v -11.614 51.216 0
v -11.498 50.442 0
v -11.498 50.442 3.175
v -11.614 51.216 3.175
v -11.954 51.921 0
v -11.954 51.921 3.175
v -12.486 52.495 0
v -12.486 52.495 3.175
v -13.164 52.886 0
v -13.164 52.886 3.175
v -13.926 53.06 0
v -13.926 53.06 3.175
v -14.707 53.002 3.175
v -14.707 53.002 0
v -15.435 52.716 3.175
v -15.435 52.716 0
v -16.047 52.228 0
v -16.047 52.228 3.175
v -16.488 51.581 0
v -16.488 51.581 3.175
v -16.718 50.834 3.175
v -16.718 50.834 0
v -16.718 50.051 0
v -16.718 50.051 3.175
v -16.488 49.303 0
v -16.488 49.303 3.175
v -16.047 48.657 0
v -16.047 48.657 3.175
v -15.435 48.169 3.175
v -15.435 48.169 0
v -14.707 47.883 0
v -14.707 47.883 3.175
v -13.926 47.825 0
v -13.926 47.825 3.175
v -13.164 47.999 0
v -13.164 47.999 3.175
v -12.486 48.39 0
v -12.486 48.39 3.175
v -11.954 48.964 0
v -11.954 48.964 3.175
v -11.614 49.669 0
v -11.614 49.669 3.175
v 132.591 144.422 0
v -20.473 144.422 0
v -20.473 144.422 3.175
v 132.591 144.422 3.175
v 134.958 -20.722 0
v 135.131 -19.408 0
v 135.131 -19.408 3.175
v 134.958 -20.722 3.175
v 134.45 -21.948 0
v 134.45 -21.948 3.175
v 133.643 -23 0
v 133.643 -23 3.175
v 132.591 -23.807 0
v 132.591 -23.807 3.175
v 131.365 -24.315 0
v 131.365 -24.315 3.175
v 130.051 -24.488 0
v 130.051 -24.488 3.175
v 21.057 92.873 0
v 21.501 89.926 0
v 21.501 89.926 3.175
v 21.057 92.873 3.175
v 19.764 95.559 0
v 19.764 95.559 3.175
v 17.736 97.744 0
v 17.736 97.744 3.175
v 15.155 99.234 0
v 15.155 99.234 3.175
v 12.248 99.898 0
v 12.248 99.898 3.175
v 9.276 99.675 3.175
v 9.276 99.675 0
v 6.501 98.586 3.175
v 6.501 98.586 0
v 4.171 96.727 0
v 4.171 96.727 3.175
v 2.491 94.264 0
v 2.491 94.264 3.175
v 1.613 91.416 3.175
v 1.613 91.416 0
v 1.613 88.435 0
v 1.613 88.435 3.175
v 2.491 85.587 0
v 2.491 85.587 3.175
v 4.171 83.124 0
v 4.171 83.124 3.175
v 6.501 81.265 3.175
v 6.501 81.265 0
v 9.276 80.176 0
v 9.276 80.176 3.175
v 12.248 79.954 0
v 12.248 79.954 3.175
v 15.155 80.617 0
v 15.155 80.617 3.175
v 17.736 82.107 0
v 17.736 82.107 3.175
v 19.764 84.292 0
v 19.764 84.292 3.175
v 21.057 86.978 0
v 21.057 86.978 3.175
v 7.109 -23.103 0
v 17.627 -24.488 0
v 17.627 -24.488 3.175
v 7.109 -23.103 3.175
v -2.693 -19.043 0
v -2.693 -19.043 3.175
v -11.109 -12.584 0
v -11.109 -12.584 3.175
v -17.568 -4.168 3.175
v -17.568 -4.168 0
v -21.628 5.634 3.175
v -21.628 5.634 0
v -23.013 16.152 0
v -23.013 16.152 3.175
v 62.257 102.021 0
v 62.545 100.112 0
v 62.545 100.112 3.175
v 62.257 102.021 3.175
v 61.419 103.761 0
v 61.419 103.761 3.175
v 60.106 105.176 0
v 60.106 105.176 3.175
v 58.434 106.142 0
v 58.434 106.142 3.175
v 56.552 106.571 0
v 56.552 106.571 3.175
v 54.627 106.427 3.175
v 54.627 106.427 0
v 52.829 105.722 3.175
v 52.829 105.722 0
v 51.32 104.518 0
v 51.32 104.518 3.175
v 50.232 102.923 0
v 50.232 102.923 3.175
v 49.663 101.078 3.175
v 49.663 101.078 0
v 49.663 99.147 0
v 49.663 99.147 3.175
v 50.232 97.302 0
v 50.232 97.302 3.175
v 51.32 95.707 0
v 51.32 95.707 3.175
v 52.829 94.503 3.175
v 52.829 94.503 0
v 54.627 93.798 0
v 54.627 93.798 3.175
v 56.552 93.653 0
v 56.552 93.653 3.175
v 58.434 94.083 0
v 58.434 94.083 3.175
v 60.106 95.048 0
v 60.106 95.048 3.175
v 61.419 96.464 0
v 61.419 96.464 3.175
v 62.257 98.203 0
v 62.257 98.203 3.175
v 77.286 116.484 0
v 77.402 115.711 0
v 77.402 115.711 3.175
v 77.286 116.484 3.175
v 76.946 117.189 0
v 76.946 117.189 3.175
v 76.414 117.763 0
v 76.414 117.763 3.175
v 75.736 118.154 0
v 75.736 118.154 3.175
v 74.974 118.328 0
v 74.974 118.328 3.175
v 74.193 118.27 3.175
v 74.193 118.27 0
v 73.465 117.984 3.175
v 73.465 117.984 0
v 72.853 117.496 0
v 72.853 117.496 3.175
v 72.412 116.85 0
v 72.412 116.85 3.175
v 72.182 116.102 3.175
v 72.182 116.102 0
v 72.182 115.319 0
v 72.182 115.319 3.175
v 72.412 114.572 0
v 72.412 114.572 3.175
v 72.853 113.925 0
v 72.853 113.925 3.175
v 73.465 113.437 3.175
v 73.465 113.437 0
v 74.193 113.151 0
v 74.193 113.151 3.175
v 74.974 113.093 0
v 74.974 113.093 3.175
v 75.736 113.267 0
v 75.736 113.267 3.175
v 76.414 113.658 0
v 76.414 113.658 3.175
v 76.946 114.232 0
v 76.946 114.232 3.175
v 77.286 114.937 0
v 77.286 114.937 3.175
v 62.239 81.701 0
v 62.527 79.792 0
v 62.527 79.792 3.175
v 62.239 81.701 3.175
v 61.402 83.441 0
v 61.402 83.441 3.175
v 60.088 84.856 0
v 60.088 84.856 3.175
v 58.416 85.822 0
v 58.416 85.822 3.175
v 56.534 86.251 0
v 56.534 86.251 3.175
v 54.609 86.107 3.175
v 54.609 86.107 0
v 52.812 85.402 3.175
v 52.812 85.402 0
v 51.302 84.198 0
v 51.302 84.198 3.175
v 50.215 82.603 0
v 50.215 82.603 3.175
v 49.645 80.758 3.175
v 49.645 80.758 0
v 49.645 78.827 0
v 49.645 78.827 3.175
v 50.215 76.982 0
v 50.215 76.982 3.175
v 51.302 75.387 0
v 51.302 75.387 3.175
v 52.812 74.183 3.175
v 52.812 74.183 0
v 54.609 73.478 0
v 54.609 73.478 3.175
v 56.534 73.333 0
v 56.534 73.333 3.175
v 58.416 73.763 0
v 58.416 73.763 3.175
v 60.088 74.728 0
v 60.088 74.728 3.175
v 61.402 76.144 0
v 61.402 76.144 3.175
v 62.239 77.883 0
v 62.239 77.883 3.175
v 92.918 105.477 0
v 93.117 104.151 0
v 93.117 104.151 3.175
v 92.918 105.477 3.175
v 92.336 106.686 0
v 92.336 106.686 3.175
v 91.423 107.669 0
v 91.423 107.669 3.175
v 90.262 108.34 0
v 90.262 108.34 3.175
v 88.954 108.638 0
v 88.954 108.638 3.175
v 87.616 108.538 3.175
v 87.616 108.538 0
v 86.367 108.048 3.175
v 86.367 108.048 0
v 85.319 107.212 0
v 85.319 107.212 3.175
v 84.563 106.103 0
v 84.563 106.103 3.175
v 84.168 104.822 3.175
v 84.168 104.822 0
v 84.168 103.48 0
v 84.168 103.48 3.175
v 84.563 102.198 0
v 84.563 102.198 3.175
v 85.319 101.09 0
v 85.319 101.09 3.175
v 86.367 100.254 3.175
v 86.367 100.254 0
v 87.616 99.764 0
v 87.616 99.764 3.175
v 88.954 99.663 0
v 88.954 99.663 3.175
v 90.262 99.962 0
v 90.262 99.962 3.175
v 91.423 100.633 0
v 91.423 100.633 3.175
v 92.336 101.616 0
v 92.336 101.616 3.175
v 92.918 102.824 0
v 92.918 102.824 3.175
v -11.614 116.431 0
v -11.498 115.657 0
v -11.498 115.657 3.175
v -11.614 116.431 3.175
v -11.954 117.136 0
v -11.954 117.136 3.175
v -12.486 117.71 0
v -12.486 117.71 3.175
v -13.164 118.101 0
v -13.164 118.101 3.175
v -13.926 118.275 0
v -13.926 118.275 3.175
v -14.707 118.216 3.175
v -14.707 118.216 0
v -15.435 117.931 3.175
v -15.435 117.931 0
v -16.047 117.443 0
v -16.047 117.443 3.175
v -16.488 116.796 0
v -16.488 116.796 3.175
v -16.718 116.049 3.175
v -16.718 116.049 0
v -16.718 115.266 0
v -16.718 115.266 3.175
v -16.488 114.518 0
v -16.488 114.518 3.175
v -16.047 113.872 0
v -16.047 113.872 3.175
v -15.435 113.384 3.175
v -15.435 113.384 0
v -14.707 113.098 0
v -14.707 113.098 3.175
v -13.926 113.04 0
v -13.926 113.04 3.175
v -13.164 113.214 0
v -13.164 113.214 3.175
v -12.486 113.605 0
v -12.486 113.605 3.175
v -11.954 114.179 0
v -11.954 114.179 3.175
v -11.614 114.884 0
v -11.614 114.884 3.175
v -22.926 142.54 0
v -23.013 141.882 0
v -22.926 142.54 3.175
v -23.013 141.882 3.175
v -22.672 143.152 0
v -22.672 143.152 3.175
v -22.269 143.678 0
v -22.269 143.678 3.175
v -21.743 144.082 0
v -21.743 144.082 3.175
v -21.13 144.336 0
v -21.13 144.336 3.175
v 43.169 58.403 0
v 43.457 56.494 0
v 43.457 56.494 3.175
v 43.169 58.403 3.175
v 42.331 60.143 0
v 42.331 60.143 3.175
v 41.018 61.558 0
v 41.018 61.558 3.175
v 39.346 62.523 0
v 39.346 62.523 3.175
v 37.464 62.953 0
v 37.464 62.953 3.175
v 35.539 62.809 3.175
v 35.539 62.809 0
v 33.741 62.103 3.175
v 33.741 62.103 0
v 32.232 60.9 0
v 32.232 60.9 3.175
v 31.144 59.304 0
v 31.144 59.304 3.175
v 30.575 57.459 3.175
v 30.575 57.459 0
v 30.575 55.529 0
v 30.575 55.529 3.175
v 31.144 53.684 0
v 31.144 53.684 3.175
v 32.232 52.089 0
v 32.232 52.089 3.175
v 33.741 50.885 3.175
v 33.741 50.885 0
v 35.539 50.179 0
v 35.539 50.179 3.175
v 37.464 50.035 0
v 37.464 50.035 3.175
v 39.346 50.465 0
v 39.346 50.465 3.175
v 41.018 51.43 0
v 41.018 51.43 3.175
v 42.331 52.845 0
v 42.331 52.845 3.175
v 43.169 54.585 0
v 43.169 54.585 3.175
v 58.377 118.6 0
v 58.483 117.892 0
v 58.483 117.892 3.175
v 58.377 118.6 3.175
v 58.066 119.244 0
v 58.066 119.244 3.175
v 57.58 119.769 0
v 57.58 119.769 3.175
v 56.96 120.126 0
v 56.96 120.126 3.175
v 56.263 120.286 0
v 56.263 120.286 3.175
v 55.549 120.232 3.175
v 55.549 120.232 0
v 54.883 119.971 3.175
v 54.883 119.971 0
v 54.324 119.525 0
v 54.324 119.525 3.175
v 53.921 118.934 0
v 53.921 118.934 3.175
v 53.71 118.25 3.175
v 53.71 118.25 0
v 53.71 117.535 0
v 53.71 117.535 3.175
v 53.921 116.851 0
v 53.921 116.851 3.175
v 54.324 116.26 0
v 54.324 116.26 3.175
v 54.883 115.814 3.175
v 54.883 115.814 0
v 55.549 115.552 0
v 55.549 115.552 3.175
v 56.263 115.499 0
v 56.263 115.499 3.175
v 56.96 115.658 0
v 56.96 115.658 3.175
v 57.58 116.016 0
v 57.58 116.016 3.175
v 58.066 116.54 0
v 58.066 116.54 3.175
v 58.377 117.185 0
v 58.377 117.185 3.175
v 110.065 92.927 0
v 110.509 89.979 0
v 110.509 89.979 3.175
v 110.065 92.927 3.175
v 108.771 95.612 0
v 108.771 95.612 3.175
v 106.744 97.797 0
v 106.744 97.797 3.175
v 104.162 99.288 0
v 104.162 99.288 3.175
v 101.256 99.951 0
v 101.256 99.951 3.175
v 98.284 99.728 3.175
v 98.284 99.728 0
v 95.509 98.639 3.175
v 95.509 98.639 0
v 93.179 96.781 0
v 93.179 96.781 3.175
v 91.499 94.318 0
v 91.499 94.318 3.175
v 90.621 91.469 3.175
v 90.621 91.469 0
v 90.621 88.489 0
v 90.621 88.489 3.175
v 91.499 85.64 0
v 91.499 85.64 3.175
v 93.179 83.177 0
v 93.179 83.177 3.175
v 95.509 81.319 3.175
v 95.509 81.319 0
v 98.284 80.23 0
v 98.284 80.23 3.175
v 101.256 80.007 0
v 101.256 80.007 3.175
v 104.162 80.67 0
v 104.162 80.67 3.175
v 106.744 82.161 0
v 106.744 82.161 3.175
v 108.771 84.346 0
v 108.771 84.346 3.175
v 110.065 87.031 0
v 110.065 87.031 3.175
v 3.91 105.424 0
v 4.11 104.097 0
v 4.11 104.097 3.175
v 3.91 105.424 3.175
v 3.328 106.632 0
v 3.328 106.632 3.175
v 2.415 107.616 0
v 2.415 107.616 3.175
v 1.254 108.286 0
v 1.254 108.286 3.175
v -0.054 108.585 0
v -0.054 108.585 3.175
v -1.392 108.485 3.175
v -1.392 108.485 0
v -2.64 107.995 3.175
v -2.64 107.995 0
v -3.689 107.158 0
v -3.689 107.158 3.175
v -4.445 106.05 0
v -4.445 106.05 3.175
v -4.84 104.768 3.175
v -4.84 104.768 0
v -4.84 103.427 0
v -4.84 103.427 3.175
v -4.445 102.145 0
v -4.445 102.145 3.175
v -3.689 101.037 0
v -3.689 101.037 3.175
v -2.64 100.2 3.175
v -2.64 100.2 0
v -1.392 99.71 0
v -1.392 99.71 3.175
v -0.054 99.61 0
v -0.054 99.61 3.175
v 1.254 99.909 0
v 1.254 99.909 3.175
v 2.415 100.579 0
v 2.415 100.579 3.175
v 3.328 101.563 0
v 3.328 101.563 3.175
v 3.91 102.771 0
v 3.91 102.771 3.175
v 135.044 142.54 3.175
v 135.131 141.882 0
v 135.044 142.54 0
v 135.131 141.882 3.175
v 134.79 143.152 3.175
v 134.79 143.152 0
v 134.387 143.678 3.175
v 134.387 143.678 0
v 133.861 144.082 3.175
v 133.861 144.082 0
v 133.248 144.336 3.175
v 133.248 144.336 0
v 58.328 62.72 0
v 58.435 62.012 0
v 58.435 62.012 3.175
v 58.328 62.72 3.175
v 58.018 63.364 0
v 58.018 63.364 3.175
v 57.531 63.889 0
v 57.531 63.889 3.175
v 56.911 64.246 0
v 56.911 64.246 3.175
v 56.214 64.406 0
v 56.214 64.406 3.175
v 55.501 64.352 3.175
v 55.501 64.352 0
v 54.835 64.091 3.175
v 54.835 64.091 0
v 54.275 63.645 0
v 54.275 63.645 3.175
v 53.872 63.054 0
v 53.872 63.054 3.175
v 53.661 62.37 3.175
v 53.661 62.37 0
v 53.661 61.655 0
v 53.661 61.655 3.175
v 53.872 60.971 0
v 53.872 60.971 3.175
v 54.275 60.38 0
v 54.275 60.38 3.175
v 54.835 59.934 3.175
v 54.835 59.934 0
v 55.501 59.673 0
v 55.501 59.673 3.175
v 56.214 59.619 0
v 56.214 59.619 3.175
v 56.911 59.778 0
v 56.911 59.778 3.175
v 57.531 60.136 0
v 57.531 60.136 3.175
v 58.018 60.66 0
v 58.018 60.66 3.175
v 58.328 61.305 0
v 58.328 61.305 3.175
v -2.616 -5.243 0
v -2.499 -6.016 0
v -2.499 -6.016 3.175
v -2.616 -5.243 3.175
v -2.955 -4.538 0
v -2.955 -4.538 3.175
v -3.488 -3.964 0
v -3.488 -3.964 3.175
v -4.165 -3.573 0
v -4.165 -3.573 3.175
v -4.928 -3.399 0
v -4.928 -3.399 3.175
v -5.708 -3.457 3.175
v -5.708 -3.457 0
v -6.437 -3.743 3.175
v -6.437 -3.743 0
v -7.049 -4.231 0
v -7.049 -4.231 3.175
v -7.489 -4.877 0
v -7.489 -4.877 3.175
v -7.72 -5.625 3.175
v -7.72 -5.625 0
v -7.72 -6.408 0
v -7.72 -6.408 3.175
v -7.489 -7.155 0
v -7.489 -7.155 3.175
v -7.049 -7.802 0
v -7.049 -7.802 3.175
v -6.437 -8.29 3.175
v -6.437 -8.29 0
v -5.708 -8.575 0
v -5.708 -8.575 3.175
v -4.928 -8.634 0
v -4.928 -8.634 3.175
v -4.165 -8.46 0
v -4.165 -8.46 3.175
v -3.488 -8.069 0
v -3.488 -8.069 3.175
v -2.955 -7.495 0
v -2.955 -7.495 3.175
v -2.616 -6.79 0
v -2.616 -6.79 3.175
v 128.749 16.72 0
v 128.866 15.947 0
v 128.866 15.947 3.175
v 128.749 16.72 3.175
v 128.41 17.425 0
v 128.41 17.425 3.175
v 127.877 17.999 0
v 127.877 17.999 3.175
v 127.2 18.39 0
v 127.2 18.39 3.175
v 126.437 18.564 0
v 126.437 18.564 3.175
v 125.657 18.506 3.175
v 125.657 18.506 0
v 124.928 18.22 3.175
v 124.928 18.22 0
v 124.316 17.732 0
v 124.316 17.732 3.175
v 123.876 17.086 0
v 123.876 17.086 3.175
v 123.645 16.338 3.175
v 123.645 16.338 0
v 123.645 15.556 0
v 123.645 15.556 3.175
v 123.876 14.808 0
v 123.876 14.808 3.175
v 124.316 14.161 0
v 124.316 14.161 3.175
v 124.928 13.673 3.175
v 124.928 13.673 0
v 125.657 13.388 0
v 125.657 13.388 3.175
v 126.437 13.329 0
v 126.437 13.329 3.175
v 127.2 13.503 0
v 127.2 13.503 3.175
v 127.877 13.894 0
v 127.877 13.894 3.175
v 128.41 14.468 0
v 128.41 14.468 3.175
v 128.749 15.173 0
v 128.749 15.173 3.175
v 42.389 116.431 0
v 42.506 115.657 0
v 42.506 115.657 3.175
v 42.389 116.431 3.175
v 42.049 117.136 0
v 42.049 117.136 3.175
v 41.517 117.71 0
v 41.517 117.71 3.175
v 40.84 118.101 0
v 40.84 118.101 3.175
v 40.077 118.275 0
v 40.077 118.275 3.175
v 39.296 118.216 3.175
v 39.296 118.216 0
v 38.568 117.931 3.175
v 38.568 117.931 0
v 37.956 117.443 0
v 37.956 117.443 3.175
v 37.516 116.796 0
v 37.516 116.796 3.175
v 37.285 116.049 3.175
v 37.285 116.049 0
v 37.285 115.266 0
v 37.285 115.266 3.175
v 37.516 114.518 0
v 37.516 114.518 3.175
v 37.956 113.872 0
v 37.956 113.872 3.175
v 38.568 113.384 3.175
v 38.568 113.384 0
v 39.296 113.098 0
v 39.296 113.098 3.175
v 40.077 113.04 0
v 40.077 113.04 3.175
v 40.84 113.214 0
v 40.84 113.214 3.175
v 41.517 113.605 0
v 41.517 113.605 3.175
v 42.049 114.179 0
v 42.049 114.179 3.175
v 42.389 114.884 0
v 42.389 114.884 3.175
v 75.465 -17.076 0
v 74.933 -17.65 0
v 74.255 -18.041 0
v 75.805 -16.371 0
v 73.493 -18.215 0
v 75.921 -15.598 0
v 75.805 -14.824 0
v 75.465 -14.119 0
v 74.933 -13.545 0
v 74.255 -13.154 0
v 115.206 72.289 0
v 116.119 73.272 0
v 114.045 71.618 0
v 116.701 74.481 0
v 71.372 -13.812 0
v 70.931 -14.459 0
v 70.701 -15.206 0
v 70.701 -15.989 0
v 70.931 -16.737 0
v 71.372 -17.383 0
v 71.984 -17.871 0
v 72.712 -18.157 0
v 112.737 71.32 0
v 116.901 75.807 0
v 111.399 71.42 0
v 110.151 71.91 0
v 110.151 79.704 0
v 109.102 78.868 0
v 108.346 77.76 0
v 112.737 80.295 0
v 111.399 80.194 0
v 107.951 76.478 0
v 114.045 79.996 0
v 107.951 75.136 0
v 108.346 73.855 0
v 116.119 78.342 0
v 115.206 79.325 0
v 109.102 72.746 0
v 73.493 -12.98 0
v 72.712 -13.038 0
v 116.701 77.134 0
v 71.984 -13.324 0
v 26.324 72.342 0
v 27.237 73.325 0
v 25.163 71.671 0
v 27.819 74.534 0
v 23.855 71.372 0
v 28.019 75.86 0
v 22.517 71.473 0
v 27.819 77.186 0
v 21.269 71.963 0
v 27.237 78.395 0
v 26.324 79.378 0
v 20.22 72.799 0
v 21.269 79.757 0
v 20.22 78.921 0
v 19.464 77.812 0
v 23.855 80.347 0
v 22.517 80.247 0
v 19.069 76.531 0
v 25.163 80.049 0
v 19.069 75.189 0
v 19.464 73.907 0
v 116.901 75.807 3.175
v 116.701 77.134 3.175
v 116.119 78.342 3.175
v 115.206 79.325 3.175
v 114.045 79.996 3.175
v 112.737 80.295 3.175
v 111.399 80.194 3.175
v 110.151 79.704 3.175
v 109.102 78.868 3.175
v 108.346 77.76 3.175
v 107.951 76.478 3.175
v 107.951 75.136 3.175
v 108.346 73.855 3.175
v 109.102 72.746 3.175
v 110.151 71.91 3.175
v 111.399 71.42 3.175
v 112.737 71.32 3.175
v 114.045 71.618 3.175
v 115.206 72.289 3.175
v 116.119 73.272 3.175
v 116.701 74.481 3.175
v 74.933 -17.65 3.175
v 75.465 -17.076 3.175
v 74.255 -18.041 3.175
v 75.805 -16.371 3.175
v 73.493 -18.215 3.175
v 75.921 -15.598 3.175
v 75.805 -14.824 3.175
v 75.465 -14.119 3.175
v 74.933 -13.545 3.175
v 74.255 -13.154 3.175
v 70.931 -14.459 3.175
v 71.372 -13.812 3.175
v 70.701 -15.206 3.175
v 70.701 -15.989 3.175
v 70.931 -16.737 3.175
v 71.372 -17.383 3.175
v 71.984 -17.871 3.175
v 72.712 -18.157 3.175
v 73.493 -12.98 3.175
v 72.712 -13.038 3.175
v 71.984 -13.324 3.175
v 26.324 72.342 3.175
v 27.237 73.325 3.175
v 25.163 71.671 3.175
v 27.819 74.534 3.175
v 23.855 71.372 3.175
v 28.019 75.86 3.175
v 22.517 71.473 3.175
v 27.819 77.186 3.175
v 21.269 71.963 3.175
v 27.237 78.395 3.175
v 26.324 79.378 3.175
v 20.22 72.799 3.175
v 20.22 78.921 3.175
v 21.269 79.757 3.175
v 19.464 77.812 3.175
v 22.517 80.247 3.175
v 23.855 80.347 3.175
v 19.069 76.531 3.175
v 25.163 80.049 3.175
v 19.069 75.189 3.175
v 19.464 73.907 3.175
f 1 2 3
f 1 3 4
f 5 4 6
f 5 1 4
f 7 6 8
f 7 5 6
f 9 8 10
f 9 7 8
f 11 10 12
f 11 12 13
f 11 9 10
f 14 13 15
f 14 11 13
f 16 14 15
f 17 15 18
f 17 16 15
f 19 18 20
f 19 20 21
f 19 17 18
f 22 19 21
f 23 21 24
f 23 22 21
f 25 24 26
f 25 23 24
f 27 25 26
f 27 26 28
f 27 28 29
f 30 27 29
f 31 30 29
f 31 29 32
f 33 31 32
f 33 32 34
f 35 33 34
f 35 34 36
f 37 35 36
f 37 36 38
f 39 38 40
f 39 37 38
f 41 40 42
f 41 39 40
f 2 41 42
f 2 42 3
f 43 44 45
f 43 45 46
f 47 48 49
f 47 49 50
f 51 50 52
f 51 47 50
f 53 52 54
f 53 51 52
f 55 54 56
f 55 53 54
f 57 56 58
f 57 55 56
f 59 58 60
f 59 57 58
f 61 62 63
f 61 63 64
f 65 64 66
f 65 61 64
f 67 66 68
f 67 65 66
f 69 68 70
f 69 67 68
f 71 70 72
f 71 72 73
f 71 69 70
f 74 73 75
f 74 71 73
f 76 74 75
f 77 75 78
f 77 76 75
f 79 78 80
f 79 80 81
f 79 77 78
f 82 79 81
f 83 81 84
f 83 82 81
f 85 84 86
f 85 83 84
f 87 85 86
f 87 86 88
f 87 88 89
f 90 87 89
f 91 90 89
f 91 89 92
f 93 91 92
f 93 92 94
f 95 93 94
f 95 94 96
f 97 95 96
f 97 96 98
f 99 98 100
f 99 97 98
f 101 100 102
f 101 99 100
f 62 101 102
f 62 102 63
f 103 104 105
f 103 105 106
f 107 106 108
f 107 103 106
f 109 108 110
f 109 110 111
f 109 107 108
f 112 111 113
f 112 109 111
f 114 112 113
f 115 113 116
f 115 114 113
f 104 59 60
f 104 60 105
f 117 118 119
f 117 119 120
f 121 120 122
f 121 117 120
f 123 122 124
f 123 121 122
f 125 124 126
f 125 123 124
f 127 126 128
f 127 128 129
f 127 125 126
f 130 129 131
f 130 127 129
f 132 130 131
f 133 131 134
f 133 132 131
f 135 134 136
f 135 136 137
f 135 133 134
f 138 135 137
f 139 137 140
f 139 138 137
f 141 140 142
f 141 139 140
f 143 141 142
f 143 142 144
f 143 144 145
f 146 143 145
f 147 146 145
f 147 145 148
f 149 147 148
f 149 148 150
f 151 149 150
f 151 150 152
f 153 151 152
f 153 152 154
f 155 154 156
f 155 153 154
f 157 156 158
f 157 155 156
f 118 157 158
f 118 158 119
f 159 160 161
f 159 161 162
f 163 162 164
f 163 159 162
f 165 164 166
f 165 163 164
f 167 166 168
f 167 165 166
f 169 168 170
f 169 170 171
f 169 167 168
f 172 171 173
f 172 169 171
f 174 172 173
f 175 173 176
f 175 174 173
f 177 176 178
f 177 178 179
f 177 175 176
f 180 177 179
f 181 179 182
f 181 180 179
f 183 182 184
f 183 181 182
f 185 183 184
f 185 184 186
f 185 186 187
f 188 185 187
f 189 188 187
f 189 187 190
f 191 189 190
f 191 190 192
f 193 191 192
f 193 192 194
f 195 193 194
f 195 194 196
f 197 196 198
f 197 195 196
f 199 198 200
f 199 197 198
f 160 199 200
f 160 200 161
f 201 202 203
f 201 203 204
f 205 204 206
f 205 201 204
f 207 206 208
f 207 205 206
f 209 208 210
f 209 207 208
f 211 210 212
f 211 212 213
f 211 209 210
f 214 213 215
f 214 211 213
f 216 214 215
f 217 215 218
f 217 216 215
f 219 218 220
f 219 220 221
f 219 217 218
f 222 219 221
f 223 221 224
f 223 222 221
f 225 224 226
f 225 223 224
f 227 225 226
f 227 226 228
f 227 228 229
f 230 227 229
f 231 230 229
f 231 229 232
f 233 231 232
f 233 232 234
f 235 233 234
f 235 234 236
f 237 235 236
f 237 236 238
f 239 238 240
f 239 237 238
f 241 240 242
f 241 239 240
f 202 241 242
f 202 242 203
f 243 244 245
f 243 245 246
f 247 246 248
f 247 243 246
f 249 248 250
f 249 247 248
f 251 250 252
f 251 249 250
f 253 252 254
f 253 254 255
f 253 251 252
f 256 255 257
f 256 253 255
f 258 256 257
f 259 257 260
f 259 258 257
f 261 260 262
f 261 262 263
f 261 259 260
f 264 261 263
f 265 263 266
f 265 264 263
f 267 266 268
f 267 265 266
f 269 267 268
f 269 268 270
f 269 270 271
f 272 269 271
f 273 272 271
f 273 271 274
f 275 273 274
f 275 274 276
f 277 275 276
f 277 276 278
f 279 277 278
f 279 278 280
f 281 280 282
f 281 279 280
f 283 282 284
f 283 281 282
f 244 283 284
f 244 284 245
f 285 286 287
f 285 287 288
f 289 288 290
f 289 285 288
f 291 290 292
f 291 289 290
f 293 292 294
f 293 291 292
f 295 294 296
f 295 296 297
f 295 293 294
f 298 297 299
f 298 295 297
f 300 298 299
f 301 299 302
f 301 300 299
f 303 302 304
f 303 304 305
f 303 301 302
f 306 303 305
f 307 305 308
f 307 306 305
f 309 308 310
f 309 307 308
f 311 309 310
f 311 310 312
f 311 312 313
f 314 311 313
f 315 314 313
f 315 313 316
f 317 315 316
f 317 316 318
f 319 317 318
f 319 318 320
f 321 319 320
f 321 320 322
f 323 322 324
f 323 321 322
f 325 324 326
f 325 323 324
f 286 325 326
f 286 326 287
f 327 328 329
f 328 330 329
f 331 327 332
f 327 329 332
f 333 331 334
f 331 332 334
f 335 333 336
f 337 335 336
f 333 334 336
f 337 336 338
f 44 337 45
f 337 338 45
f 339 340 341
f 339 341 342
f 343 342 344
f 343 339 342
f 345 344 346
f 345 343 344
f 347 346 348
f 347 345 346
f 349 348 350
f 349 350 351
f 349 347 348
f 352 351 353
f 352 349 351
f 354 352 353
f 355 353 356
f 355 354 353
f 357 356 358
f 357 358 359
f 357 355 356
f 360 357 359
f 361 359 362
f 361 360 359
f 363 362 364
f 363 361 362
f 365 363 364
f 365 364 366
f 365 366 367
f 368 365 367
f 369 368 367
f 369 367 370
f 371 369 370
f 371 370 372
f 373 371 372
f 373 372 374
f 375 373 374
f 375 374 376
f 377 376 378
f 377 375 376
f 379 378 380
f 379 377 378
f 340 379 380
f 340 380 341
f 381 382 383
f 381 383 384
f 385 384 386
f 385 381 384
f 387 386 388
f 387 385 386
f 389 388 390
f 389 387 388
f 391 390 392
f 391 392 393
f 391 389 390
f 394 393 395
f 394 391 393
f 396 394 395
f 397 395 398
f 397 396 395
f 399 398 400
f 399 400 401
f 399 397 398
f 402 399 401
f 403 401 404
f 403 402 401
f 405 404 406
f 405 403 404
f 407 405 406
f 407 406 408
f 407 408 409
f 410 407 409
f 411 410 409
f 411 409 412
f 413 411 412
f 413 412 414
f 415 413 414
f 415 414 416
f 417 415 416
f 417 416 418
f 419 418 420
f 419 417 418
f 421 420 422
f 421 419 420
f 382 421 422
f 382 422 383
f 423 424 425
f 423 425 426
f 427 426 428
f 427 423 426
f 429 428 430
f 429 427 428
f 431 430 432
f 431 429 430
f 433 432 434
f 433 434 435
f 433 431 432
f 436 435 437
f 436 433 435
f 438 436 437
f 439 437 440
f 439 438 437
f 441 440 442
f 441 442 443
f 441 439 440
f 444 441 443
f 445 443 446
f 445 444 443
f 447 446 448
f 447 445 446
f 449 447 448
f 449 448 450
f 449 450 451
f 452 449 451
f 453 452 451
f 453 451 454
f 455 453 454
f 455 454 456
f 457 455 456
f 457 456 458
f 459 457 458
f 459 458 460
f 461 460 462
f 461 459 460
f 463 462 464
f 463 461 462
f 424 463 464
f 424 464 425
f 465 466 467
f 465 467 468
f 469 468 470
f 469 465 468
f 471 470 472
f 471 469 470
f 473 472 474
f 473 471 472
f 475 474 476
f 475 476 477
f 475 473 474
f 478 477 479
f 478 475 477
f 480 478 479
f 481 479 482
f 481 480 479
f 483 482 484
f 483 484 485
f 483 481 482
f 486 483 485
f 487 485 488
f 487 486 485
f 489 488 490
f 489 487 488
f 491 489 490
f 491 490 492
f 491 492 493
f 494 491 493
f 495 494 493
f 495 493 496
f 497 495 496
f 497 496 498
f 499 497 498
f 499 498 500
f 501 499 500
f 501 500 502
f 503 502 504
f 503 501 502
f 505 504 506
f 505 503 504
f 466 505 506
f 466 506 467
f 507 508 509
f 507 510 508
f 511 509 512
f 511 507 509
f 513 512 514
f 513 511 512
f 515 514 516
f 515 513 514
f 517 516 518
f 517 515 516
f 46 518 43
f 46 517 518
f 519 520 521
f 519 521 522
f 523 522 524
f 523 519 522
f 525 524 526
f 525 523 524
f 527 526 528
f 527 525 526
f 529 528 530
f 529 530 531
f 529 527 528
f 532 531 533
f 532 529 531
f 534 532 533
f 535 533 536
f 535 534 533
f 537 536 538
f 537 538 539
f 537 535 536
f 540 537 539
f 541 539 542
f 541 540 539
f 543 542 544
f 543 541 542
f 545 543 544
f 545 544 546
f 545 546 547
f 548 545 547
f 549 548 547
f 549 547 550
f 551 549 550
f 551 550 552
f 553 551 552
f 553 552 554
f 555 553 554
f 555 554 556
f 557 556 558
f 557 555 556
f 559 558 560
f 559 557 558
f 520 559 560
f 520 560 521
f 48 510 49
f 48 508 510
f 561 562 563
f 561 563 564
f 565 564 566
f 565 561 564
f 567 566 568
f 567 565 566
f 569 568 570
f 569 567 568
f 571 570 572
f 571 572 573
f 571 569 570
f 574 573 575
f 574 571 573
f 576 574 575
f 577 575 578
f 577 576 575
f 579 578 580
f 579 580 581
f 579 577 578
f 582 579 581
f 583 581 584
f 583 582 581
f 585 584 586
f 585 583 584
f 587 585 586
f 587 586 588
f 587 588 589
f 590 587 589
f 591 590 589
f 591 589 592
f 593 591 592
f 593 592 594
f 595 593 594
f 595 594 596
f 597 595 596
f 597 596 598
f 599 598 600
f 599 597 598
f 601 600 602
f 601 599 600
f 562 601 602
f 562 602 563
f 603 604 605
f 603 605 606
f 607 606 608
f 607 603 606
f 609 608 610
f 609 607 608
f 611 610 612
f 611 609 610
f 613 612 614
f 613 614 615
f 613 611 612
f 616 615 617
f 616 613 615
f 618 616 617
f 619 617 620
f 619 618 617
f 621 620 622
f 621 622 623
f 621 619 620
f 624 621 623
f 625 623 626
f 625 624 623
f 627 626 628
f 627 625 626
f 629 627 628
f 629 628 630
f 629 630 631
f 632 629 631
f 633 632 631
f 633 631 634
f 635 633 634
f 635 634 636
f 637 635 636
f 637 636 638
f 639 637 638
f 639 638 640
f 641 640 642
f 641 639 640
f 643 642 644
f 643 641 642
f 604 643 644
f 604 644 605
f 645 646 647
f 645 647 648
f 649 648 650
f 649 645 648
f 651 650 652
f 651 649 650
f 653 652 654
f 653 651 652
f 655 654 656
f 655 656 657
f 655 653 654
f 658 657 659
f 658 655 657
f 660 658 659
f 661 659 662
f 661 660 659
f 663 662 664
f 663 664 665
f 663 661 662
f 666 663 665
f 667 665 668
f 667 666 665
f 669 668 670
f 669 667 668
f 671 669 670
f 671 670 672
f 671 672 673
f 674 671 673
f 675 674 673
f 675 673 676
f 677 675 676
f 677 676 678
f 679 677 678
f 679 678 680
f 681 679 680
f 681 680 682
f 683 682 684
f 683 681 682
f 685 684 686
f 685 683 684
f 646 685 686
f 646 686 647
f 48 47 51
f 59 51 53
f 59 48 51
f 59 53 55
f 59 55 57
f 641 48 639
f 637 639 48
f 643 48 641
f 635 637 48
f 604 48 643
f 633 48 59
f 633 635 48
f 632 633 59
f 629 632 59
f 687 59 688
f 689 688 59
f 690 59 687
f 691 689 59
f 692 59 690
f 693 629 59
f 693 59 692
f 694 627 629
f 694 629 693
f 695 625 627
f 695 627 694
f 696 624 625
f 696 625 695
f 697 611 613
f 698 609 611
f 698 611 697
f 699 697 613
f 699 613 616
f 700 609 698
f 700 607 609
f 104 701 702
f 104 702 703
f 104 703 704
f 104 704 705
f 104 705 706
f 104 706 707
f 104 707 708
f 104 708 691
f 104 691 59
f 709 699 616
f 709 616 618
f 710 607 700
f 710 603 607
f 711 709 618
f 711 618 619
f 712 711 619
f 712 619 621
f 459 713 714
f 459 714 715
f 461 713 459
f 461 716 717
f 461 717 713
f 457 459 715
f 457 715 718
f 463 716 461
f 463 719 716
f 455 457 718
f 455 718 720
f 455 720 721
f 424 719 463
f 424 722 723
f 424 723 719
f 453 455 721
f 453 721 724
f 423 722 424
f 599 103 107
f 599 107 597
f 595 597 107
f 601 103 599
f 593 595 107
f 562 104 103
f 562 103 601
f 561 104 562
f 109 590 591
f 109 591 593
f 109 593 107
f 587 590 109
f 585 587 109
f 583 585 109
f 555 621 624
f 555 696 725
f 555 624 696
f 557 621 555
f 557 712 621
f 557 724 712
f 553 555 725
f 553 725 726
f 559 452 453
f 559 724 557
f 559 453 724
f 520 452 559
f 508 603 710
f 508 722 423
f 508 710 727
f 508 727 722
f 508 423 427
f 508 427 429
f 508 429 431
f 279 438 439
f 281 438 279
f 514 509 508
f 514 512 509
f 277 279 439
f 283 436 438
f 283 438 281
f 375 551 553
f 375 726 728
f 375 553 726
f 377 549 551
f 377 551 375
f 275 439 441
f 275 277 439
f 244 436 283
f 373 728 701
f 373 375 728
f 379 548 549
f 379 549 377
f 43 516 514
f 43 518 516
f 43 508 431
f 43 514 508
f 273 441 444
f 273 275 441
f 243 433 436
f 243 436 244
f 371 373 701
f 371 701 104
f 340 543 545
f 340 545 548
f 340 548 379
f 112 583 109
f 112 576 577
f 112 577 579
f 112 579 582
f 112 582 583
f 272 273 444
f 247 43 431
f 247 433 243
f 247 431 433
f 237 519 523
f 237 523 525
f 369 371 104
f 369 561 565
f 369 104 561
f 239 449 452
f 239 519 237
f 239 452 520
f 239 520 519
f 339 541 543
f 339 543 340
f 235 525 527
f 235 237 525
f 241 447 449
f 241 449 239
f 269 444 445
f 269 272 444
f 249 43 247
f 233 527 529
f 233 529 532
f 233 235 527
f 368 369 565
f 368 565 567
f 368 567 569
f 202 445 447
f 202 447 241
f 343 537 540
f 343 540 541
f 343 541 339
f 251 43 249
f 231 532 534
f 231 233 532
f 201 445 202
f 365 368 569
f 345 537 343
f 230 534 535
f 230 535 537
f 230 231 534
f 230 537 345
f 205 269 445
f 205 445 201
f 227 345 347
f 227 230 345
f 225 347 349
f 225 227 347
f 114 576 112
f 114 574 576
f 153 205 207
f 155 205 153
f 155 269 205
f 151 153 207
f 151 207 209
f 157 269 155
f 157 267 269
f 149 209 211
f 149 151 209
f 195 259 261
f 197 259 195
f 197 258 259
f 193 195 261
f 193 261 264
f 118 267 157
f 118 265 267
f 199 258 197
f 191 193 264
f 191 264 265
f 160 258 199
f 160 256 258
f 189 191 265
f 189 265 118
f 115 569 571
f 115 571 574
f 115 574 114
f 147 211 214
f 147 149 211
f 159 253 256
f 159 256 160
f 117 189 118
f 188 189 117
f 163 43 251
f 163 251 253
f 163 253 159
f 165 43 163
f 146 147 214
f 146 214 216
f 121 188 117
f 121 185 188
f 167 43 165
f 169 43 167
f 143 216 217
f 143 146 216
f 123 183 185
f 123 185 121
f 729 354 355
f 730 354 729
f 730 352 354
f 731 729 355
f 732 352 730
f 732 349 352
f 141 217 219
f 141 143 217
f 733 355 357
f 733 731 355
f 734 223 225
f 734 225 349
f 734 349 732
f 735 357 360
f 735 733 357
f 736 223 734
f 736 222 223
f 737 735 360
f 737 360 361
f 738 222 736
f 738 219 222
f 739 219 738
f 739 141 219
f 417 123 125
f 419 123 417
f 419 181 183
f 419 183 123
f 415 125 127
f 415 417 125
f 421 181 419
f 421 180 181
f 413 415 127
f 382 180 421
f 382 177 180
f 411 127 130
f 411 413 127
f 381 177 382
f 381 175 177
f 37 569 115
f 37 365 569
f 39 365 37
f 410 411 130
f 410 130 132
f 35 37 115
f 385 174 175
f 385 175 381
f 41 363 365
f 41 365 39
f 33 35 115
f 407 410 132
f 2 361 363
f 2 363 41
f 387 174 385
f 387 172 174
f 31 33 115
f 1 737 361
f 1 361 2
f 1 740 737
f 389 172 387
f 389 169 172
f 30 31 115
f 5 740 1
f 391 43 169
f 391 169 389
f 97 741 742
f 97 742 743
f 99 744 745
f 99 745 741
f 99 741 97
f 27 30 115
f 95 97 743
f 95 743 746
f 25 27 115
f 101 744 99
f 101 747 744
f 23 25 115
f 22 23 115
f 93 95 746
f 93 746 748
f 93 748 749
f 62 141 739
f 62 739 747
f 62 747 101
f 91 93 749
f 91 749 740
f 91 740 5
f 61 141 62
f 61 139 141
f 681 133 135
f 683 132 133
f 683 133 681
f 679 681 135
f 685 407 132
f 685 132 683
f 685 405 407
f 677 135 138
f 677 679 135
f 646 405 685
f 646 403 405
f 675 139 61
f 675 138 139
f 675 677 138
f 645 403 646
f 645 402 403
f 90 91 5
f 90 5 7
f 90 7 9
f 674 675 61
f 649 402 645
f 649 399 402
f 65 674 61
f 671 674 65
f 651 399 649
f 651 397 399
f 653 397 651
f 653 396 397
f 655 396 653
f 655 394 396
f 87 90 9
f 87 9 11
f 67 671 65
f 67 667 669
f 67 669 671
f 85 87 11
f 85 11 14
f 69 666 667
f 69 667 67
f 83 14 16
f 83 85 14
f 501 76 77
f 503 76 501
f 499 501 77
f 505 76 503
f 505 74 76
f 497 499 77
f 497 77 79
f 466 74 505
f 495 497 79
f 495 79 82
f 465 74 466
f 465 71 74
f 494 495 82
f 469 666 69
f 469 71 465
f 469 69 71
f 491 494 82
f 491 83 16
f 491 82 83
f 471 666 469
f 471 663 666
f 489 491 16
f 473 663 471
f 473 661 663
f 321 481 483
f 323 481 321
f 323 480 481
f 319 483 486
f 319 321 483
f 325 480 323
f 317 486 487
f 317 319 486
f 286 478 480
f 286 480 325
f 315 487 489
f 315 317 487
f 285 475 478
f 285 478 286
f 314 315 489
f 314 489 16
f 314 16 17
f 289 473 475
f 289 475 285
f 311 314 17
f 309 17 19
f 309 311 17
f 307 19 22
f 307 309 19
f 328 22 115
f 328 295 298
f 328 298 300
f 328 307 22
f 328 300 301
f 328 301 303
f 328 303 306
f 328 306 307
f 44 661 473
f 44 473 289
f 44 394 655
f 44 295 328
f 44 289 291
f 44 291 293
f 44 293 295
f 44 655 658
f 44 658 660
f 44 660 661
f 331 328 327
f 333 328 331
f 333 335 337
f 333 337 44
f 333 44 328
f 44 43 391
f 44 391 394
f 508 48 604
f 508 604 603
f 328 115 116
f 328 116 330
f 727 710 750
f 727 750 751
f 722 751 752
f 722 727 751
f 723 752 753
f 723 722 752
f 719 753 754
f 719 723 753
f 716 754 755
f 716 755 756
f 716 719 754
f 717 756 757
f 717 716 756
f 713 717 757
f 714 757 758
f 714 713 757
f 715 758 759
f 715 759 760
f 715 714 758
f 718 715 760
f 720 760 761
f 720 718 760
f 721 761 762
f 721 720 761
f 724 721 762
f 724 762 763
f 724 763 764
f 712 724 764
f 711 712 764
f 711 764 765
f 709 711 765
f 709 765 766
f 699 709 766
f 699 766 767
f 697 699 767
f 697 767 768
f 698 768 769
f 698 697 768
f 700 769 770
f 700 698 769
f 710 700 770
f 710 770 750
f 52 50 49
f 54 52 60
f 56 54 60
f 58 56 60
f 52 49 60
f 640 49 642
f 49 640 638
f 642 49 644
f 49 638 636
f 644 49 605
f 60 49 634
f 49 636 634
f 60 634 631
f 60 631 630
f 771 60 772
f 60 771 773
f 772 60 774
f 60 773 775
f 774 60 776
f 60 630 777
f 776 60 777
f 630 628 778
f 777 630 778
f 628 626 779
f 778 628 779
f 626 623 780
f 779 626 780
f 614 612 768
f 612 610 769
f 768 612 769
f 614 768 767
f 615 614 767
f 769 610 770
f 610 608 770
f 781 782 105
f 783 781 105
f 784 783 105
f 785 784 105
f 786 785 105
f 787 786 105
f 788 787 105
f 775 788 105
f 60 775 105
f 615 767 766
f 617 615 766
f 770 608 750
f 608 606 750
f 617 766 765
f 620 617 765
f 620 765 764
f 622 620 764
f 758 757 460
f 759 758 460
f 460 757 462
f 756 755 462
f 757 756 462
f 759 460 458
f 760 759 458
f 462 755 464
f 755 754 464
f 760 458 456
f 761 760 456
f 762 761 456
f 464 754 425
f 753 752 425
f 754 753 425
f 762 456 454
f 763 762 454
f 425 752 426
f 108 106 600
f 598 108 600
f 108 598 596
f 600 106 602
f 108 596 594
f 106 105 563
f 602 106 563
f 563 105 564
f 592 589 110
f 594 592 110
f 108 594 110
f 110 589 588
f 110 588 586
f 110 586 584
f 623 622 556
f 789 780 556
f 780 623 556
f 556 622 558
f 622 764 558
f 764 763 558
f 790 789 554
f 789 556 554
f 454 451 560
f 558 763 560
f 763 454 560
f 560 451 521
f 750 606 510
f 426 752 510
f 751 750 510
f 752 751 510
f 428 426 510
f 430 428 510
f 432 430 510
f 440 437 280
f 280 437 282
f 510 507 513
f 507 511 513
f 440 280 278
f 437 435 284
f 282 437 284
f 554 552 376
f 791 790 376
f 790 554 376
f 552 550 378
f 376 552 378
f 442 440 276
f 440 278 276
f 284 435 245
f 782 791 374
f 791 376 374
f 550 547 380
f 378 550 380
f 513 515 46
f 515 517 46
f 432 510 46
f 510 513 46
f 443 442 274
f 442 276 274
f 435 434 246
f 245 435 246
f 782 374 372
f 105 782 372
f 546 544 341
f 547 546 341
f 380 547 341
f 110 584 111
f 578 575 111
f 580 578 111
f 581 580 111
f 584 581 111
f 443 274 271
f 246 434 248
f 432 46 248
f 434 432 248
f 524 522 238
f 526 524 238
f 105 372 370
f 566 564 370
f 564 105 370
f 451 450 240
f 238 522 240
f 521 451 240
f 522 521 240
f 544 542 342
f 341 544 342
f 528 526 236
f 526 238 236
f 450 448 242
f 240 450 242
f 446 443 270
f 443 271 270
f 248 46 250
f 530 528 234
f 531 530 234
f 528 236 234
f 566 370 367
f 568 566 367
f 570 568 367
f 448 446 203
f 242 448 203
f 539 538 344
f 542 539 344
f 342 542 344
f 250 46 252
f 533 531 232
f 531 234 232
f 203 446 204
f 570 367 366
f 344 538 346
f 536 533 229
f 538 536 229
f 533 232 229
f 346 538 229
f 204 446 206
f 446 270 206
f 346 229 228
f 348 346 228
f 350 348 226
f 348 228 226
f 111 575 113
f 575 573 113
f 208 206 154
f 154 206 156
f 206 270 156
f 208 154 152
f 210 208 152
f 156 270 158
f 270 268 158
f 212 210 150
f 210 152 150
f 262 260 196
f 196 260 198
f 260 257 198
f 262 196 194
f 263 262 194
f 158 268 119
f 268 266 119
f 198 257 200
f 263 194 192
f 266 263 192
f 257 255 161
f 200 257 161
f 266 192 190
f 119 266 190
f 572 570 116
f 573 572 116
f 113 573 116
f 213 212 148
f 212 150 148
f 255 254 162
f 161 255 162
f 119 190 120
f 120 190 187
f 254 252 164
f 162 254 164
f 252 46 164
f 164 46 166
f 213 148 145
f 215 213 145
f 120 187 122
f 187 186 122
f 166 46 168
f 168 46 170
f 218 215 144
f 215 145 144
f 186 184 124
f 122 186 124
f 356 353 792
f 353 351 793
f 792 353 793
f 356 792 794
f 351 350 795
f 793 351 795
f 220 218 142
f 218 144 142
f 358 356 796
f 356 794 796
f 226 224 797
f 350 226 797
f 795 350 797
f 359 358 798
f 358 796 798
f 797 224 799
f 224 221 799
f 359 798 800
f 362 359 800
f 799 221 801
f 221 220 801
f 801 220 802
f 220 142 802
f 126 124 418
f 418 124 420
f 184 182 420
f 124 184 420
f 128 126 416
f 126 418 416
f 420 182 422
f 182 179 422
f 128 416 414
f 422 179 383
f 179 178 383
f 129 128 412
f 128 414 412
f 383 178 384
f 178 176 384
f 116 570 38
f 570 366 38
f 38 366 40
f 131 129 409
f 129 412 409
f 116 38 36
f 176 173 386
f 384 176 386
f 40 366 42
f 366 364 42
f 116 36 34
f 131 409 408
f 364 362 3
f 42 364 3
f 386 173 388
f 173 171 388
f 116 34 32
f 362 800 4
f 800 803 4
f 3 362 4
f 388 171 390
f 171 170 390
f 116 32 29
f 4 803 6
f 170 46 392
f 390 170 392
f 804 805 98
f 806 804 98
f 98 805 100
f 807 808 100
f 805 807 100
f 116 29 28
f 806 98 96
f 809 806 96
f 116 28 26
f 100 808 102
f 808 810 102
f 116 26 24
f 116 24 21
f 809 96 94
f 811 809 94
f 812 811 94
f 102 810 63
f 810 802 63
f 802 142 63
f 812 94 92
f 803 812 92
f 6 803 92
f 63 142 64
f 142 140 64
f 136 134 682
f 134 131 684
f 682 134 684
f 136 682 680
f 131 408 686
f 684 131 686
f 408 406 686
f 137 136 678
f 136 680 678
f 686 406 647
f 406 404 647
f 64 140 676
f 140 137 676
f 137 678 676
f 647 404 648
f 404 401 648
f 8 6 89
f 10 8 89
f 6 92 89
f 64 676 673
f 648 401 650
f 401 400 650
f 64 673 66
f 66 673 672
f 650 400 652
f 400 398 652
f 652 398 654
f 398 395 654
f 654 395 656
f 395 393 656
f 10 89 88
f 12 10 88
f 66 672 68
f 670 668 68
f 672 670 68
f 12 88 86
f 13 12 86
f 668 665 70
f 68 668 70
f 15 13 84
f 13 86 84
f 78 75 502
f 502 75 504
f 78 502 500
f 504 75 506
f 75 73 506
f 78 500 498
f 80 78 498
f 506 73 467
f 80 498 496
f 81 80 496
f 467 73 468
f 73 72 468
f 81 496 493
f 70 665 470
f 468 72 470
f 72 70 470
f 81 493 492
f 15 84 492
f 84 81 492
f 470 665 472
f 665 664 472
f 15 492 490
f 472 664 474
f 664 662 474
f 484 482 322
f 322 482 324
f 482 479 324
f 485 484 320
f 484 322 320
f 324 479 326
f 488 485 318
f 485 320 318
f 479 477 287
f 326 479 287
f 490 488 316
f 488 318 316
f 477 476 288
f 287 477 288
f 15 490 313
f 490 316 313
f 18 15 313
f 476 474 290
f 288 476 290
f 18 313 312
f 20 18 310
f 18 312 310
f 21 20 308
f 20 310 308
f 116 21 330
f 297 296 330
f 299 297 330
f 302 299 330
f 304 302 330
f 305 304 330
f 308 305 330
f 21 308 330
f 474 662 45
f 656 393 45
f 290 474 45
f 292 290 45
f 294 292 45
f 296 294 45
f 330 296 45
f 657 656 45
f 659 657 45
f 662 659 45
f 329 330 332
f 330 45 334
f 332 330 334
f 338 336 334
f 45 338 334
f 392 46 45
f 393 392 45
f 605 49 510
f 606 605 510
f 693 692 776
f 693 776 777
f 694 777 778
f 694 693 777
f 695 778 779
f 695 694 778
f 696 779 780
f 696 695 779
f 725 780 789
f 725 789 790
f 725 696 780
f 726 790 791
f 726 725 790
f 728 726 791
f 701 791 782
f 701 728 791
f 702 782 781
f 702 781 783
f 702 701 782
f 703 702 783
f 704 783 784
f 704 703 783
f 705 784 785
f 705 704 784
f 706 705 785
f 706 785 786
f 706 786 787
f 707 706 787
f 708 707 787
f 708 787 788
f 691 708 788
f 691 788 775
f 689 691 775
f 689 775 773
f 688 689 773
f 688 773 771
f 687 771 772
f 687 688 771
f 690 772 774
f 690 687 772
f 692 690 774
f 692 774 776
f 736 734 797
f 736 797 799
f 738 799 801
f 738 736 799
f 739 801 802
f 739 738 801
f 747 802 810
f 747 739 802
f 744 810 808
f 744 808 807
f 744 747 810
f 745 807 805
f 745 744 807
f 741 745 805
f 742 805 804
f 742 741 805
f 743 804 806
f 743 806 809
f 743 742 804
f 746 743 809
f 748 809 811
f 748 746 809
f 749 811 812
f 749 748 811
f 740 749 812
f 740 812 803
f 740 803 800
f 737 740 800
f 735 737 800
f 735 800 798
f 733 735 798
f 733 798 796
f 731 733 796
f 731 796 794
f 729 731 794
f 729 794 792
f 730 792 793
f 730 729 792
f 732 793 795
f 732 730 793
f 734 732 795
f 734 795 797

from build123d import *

# Parameters (mm, degrees)
SKETCH2_R           = 2.625
SKETCH2_R_2         = 6.477
SKETCH2_R_3         = 2.4
SKETCH2_R_4         = 10
SKETCH2_R_5         = 4.5000037
BOSS_EXTRUDE1_DEPTH = 3.175
BOSS_EXTRUDE2_START = -3.175
BOSS_EXTRUDE2_DEPTH = 3.175
FILLET1_R           = 2.54


with BuildPart() as part:
    # Sketch2 → Boss-Extrude1 (new body)
    with BuildSketch(Plane.XY):
        with BuildLine():
            Line((-16.662660117, 125.372318995), (128.780651825, 125.372318995))
            ThreePointArc((128.780651825, 125.372318995), (133.270779886, 123.512447055), (135.130651825, 119.022318995))
            Line((135.130651825, 119.022318995), (135.130651825, -19.407679937))
            ThreePointArc((135.130651825, -19.407679937), (133.642754274, -22.999782385), (130.050651825, -24.487679937))
            Line((130.050651825, -24.487679937), (17.627339883, -24.487679937))
            ThreePointArc((17.627339883, -24.487679937), (-11.109479704, -12.584499524), (-23.012660117, 16.152320063))
            Line((-23.012660117, 16.152320063), (-23.012660117, 119.022318995))
            ThreePointArc((-23.012660117, 119.022318995), (-21.152788178, 123.512447055), (-16.662660117, 125.372318995))
        make_face()
        with Locations((-14.122660117, 115.657274828)):
            Circle(SKETCH2_R, mode=Mode.SUBTRACT)
        with Locations((56.050128961, 79.792333504)):
            Circle(SKETCH2_R_2, mode=Mode.SUBTRACT)
        with Locations((56.034611898, 62.012340275)):
            Circle(SKETCH2_R_3, mode=Mode.SUBTRACT)
        with Locations((56.067862747, 100.112325766)):
            Circle(SKETCH2_R_2, mode=Mode.SUBTRACT)
        with Locations((56.08337981, 117.892318995)):
            Circle(SKETCH2_R_3, mode=Mode.SUBTRACT)
        with Locations((36.9797887, 56.4940647)):
            Circle(SKETCH2_R_2, mode=Mode.SUBTRACT)
        with Locations((39.880571418, 115.657274828)):
            Circle(SKETCH2_R, mode=Mode.SUBTRACT)
        with Locations((74.777420291, 115.710615977)):
            Circle(SKETCH2_R, mode=Mode.SUBTRACT)
        with Locations((-14.122660117, 50.442319529)):
            Circle(SKETCH2_R, mode=Mode.SUBTRACT)
        with Locations((-5.124288877, -6.016277999)):
            Circle(SKETCH2_R, mode=Mode.SUBTRACT)
        with Locations((73.296411889, -15.597679937)):
            Circle(SKETCH2_R, mode=Mode.SUBTRACT)
        with Locations((126.240651825, 15.946756738)):
            Circle(SKETCH2_R, mode=Mode.SUBTRACT)
        with Locations((11.5011229, 89.92565906)):
            Circle(SKETCH2_R_4, mode=Mode.SUBTRACT)
        with Locations((100.509036058, 89.97900021)):
            Circle(SKETCH2_R_4, mode=Mode.SUBTRACT)
        with Locations((88.617464572, 104.15082325)):
            Circle(SKETCH2_R_5, mode=Mode.SUBTRACT)
        with Locations((112.400607544, 75.80717717)):
            Circle(SKETCH2_R_5, mode=Mode.SUBTRACT)
        with Locations((-0.390448587, 104.097482101)):
            Circle(SKETCH2_R_5, mode=Mode.SUBTRACT)
        with Locations((23.518543133, 75.859913549)):
            Circle(SKETCH2_R_5, mode=Mode.SUBTRACT)
    extrude(amount=BOSS_EXTRUDE1_DEPTH)

    # Sketch3 → Boss-Extrude2 (add)
    with BuildSketch(Plane.XY.offset(3.175).offset(BOSS_EXTRUDE2_START)):
        with BuildLine():
            Line((-23.012660117, 119.022318995), (-23.012660117, 144.422318995))
            Line((-23.012660117, 144.422318995), (135.130651825, 144.422318995))
            Line((135.130651825, 144.422318995), (135.130651825, 119.022318995))
            ThreePointArc((135.130651825, 119.022318995), (133.270779886, 123.512447055), (128.780651825, 125.372318995))
            Line((128.780651825, 125.372318995), (-16.662660117, 125.372318995))
            ThreePointArc((-16.662660117, 125.372318995), (-21.152788178, 123.512447055), (-23.012660117, 119.022318995))
        make_face()
    extrude(amount=BOSS_EXTRUDE2_DEPTH)

    # Fillet1
    fillet1_edges = [part.edges().sort_by_distance(p)[0] for p in [
        (-23.012660117, 144.422318995, 1.5875),
        (135.130651825, 144.422318995, 1.5875),
    ]]
    fillet(fillet1_edges, radius=FILLET1_R)


solid = part.part
